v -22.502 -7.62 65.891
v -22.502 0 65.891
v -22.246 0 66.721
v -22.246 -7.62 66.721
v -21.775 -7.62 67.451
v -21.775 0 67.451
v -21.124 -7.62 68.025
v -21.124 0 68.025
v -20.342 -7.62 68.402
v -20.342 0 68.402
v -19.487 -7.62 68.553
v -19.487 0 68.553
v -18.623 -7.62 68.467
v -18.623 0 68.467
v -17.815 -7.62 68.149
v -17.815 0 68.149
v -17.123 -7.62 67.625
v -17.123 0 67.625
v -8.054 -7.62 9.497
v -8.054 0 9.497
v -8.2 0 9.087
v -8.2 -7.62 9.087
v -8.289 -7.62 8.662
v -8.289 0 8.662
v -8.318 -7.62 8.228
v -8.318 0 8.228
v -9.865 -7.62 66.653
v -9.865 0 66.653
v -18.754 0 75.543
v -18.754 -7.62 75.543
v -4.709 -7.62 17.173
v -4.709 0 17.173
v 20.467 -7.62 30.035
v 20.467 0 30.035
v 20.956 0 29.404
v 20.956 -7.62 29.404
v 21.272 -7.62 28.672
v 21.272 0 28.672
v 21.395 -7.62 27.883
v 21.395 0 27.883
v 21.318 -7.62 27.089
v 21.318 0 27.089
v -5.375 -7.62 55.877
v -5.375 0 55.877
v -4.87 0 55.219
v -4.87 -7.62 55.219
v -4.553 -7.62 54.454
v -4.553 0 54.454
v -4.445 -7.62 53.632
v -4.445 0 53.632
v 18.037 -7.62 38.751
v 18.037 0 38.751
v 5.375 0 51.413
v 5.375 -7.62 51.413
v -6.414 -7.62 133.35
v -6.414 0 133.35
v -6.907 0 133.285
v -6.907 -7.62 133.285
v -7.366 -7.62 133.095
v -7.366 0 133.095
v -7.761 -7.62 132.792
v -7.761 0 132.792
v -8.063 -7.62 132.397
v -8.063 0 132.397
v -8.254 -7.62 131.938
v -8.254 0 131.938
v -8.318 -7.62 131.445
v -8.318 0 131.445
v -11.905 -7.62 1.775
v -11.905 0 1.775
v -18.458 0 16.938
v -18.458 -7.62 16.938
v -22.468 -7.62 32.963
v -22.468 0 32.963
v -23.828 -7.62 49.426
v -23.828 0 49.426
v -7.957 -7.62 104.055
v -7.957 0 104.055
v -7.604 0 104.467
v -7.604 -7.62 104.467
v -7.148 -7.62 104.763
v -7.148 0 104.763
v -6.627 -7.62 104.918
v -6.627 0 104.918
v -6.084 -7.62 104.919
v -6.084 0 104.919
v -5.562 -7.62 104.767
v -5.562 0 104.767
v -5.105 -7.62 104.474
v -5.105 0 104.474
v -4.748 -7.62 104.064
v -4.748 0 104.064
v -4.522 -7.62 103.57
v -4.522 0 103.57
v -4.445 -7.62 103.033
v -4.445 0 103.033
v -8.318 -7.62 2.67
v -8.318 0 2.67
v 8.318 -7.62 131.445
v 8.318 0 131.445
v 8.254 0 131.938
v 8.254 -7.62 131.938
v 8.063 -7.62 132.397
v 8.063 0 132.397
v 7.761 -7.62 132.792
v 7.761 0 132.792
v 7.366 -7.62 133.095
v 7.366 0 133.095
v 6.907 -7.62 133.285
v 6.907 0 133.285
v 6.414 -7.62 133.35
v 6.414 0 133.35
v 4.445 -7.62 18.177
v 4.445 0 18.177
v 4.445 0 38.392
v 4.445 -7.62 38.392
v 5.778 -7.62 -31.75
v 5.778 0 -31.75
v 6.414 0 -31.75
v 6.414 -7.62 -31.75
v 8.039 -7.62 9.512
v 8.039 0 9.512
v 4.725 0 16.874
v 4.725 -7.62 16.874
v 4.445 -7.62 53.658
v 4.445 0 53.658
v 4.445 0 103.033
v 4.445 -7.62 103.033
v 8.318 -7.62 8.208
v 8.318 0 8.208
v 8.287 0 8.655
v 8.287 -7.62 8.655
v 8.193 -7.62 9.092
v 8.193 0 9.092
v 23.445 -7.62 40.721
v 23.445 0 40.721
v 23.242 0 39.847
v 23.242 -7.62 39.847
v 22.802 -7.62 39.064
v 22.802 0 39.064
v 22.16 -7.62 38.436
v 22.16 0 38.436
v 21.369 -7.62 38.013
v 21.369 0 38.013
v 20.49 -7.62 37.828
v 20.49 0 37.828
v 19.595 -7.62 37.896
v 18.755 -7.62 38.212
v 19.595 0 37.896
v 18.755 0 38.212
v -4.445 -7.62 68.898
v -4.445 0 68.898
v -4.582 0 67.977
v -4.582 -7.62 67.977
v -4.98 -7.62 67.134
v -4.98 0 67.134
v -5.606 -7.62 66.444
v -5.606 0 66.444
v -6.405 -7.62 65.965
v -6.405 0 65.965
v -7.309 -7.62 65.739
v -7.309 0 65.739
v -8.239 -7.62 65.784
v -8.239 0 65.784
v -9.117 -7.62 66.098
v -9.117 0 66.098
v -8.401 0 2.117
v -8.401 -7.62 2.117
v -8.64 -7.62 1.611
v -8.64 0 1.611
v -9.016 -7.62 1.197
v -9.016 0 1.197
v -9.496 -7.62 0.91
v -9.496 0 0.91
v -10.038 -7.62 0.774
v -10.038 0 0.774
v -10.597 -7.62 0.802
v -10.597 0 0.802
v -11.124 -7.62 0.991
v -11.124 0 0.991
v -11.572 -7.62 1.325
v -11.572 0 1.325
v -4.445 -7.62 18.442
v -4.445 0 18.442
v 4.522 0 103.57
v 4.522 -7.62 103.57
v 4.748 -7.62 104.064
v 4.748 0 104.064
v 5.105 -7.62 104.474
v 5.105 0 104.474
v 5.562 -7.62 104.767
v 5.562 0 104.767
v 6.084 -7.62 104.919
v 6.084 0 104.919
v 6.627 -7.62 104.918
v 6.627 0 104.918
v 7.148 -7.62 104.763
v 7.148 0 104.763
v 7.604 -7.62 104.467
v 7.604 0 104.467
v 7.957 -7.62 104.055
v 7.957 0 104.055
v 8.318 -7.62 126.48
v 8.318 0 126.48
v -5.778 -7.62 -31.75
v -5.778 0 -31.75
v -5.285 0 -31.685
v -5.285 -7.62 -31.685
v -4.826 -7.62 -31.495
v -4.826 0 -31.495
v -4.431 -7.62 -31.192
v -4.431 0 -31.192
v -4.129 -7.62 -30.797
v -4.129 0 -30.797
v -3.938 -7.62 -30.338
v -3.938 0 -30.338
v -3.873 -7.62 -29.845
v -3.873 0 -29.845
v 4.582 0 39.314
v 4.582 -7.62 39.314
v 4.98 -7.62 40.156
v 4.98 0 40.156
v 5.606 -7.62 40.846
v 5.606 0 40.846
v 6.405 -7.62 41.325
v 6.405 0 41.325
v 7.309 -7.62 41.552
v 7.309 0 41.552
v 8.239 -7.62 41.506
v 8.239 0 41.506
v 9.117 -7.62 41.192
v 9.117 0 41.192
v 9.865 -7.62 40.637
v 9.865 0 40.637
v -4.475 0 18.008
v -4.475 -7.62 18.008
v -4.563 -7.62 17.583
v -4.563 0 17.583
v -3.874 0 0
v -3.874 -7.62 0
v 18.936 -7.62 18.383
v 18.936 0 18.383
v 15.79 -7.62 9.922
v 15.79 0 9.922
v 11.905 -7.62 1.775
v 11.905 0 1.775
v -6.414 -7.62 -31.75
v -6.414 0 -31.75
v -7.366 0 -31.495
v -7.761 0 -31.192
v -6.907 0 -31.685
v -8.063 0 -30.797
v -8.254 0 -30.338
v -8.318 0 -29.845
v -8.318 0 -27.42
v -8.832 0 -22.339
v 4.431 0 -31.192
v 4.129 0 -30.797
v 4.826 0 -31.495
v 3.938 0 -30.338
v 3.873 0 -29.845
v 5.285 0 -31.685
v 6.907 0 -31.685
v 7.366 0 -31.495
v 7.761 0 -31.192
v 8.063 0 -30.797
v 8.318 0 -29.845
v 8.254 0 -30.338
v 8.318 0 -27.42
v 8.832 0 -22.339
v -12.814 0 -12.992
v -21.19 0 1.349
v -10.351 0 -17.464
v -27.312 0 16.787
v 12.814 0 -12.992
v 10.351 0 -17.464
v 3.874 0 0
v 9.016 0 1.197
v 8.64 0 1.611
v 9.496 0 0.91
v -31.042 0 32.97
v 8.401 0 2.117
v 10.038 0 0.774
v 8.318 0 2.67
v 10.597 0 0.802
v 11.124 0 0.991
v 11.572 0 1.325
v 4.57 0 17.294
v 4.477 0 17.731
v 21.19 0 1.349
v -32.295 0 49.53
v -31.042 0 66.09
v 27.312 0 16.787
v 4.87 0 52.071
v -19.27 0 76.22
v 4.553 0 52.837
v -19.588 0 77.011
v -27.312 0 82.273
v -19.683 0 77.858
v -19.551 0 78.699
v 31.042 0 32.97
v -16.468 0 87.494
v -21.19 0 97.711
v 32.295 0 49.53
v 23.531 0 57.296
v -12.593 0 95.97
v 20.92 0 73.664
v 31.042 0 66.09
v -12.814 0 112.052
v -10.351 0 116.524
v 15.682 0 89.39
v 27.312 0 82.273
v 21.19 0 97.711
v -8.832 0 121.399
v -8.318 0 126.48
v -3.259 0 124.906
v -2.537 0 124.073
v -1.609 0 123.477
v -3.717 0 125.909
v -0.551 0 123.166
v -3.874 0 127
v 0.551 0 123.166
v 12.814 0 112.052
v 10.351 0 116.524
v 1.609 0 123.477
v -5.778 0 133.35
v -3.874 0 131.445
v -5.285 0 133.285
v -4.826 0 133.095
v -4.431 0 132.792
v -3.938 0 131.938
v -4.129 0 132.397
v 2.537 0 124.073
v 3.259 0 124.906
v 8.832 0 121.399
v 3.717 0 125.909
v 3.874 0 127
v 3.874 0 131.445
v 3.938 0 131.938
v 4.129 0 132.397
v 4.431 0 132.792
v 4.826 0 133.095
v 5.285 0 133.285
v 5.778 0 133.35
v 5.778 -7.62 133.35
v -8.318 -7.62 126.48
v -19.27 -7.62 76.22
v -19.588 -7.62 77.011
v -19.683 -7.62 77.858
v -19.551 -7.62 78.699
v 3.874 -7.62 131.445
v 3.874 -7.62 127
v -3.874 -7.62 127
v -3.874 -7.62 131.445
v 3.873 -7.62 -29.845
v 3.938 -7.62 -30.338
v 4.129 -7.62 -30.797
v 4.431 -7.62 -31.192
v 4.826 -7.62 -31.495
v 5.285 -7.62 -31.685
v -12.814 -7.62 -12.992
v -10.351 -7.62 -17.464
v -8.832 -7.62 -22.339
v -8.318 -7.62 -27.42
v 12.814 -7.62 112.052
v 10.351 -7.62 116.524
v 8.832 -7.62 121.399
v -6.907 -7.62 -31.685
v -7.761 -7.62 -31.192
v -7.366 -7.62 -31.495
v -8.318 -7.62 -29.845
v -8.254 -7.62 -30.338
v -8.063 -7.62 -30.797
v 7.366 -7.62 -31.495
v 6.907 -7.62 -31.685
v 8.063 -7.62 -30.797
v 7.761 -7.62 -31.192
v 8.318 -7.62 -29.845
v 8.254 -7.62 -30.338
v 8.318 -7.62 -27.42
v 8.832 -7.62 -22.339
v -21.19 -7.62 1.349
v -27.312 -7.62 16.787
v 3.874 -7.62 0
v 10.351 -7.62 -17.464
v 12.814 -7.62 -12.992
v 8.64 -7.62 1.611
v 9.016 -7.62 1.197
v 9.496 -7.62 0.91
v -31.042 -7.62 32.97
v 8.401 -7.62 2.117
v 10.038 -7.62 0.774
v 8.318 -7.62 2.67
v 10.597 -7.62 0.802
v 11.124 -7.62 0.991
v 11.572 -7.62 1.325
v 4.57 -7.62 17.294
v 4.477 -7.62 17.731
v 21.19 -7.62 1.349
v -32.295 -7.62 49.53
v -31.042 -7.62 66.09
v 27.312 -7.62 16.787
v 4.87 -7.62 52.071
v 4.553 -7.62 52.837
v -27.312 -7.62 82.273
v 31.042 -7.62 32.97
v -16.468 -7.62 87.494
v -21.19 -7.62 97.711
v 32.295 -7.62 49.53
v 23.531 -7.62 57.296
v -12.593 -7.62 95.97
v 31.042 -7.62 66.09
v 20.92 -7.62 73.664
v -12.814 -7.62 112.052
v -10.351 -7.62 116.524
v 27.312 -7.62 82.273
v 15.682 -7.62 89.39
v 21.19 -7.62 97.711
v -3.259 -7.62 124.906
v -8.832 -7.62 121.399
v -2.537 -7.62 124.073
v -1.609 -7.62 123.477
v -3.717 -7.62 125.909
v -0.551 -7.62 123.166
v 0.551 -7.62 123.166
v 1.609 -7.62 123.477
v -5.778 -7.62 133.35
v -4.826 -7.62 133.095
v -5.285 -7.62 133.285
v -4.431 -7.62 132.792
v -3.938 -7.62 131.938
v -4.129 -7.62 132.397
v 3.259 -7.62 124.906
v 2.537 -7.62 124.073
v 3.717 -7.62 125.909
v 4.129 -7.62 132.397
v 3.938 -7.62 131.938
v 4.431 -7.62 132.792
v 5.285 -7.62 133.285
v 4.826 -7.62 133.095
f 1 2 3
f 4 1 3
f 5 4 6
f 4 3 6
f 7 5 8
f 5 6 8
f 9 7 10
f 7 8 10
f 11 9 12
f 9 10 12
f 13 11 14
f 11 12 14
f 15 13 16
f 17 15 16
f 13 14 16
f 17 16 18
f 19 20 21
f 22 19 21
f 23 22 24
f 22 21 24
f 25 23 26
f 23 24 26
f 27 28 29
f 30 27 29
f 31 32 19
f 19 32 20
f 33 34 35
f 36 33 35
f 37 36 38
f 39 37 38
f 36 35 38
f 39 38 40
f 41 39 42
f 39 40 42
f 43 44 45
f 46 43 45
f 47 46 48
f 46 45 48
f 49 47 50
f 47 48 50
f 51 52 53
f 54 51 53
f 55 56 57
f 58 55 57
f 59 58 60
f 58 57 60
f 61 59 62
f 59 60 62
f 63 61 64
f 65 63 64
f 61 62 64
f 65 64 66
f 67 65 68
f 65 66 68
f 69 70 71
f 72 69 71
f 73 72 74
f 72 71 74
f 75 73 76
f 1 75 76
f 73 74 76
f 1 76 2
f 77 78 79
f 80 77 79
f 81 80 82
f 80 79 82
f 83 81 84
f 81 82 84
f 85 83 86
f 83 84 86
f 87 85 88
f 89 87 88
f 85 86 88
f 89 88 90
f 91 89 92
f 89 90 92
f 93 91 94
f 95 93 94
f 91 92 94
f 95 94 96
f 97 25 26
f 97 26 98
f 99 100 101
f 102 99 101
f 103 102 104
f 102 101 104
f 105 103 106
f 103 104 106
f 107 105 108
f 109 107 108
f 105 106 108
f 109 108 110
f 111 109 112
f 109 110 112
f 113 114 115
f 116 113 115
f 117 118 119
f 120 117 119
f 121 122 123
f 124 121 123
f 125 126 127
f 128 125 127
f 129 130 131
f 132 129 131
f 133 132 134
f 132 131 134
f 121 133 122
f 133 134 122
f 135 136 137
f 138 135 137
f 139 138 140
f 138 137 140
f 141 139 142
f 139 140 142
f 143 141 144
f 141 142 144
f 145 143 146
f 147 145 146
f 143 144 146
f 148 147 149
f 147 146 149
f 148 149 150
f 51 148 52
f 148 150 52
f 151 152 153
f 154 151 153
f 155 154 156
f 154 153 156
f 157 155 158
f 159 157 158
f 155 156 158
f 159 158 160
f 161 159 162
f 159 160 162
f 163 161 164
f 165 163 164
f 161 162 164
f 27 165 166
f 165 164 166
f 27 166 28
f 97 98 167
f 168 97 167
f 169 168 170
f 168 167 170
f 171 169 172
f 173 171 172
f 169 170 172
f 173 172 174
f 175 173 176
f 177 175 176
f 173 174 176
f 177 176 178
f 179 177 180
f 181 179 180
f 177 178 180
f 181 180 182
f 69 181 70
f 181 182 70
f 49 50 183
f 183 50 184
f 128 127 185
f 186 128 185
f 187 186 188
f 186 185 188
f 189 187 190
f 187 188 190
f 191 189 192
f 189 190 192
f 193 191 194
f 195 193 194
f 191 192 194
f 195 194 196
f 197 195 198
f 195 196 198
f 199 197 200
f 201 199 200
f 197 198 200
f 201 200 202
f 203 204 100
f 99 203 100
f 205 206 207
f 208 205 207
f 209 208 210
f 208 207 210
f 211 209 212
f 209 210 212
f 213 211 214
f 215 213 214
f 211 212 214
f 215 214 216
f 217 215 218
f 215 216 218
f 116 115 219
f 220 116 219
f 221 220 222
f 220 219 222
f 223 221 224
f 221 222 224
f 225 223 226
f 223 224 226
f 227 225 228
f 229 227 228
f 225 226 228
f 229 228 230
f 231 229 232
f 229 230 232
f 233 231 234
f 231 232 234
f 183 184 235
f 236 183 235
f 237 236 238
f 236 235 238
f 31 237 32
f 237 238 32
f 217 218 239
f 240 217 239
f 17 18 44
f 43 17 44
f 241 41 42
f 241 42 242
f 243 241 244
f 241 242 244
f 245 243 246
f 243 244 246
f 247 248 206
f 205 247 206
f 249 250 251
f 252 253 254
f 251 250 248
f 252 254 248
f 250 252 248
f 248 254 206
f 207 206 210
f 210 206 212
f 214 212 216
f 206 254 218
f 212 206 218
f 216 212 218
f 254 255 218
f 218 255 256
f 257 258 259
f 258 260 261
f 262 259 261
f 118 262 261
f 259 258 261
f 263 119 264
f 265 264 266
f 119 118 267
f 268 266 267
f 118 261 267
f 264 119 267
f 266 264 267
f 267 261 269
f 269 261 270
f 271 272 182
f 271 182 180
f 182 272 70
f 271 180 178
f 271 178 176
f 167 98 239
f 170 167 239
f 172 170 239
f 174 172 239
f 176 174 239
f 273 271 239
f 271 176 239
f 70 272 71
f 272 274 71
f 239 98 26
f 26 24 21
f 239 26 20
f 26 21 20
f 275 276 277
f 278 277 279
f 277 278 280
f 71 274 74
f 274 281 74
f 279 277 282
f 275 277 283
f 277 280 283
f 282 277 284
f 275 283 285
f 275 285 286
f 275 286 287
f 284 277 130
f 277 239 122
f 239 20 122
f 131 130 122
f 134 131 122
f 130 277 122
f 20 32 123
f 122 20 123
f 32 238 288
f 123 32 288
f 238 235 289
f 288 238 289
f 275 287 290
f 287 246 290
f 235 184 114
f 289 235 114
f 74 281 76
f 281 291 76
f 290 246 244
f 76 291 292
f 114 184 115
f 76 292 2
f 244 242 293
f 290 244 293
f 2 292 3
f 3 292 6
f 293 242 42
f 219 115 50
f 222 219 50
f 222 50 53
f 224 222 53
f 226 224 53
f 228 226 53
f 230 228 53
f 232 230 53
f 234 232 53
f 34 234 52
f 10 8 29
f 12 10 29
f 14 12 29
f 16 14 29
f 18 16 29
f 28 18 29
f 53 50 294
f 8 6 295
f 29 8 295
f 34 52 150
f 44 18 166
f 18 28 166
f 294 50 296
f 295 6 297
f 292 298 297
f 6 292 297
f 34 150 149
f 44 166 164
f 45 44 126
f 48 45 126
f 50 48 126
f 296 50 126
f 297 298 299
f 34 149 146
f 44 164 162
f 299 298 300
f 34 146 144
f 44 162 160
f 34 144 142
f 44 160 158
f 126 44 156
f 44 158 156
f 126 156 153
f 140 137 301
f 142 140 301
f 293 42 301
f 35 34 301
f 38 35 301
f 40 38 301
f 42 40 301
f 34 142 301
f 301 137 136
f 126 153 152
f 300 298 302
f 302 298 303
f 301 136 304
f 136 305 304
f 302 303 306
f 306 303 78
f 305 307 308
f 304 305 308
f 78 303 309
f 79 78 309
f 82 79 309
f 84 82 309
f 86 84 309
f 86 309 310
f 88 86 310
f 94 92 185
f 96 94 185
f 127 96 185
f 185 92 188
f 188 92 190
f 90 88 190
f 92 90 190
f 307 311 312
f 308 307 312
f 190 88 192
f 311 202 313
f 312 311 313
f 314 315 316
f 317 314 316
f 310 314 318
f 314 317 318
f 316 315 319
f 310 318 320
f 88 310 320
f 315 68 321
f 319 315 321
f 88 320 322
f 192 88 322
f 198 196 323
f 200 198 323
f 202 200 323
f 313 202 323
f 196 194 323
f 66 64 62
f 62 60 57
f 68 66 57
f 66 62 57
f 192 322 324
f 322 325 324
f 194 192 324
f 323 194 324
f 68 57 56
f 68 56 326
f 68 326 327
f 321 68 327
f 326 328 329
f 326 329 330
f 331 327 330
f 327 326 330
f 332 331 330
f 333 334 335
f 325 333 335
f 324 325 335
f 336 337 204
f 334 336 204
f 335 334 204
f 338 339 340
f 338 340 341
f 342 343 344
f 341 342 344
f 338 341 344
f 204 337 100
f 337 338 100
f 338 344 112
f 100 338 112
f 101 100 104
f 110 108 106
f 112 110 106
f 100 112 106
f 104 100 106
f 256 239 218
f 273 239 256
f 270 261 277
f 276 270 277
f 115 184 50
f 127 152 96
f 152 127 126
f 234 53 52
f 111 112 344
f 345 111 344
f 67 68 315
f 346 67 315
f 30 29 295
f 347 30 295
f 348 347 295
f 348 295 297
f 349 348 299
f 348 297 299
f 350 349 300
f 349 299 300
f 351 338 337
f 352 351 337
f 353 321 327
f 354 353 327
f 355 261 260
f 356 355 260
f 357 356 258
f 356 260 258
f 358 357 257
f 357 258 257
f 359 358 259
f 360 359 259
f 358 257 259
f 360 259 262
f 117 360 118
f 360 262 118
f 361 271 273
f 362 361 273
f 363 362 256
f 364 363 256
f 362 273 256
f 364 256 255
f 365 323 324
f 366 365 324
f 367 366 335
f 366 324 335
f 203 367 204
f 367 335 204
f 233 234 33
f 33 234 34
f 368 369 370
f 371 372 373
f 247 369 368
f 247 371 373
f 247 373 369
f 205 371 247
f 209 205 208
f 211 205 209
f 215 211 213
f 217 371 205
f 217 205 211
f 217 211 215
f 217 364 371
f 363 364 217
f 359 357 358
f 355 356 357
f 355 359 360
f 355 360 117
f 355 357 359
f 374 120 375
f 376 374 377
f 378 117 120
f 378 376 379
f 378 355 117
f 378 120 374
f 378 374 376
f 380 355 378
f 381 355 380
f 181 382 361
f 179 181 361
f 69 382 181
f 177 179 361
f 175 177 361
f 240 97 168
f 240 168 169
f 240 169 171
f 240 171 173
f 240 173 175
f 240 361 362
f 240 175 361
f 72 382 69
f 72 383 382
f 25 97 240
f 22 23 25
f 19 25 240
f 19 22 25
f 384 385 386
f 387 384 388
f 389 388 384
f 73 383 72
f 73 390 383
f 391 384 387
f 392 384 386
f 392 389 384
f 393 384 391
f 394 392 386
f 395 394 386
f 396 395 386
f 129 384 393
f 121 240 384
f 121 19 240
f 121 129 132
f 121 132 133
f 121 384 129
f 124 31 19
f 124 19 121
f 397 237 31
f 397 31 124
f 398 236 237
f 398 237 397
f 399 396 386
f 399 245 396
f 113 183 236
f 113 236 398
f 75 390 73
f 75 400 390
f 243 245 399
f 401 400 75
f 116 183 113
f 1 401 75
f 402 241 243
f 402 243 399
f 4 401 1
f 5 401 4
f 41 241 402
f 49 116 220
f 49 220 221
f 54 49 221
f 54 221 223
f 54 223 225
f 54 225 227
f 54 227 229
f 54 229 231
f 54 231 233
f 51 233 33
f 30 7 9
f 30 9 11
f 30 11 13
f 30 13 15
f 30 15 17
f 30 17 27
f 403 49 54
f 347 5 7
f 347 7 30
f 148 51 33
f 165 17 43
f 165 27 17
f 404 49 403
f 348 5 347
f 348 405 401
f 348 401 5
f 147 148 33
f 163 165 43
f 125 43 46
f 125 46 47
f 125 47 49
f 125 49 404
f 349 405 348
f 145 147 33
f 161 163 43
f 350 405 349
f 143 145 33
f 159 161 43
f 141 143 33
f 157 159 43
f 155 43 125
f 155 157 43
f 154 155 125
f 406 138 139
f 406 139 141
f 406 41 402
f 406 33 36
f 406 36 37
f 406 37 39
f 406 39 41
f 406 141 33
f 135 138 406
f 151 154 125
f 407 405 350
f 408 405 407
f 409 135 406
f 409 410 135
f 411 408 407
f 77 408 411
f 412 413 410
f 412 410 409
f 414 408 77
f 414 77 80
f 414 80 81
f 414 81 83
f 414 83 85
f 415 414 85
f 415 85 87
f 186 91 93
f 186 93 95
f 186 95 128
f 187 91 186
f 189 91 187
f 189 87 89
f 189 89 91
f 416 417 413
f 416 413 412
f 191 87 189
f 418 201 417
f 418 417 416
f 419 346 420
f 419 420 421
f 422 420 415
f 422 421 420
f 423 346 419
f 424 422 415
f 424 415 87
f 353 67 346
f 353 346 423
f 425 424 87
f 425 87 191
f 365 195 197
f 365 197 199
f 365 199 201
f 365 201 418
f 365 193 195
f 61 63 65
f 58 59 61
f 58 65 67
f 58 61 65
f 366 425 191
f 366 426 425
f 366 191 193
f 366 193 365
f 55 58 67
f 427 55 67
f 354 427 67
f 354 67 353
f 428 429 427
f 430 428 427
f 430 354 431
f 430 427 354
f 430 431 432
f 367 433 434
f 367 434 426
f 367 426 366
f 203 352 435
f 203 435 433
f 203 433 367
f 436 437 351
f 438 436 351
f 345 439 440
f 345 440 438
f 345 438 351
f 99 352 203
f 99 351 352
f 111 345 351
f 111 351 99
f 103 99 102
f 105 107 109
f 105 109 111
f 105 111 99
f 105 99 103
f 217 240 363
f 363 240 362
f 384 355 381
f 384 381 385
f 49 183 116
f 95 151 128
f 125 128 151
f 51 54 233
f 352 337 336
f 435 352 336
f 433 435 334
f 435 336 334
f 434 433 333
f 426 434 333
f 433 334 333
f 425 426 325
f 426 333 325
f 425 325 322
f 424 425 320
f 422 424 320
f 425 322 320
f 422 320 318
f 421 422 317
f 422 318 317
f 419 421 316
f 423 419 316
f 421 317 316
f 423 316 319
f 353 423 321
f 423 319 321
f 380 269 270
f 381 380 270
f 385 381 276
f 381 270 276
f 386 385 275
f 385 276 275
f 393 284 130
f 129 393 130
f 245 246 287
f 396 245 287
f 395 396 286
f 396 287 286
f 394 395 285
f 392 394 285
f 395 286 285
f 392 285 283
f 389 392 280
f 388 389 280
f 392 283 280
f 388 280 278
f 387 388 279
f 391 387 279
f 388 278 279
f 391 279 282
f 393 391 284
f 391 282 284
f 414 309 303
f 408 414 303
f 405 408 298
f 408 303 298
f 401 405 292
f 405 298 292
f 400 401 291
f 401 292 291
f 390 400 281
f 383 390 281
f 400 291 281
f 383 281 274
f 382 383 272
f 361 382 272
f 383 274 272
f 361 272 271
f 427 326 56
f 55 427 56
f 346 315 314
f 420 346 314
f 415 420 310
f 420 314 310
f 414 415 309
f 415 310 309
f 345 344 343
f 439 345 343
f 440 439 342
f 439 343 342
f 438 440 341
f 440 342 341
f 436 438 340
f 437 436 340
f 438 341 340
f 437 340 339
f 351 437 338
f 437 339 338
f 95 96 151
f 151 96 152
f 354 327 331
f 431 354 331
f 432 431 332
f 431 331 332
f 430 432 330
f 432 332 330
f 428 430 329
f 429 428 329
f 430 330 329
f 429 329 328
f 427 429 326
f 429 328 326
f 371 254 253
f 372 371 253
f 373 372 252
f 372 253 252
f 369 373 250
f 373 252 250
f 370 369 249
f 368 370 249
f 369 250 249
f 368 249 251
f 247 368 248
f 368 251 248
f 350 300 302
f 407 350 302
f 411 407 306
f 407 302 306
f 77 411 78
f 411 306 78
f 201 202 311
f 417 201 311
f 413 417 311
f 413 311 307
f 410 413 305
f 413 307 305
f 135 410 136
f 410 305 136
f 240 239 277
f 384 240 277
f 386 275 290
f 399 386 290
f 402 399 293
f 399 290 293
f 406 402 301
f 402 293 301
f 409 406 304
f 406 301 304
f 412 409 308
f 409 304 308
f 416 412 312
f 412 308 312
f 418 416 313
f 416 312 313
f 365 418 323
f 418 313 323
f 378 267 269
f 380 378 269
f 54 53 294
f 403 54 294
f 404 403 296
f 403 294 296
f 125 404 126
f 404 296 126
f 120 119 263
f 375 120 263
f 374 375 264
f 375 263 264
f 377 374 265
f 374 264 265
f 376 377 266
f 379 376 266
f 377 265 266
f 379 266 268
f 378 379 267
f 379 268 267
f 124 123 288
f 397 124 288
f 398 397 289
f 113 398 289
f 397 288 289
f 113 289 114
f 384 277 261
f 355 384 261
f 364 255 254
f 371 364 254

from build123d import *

# Parameters (mm, degrees)
F1_DEPTH = 7.62


with BuildPart() as f1:
    # F0 (on Front) → F1 (new body)
    with BuildSketch(Plane.XZ):
        with BuildLine():
            Line((-3.8735, -29.845), (-3.8735, 0))
            Line((-3.8735, 0), (3.8735, 0))
            Line((3.8735, 0), (3.8735, -29.845))
            ThreePointArc((3.8735, -29.845), (4.431462, -31.192038), (5.7785, -31.75))
            Line((5.7785, -31.75), (6.4135, -31.75))
            ThreePointArc((6.4135, -31.75), (7.760538, -31.192038), (8.3185, -29.845))
            Line((8.3185, -29.845), (8.3185, -27.419537))
            ThreePointArc((8.3185, -27.419537), (9.468431, -19.863469), (12.814103, -12.991572))
            ThreePointArc((12.814103, -12.991572), (32.295171, 49.53), (12.814103, 112.051572))
            ThreePointArc((12.814103, 112.051572), (9.468431, 118.923469), (8.3185, 126.479537))
            Line((8.3185, 126.479537), (8.3185, 131.445))
            ThreePointArc((8.3185, 131.445), (7.760538, 132.792038), (6.4135, 133.35))
            Line((6.4135, 133.35), (5.7785, 133.35))
            ThreePointArc((5.7785, 133.35), (4.431462, 132.792038), (3.8735, 131.445))
            Line((3.8735, 131.445), (3.8735, 127))
            ThreePointArc((3.8735, 127), (0, 123.1265), (-3.8735, 127))
            Line((-3.8735, 127), (-3.8735, 131.445))
            ThreePointArc((-3.8735, 131.445), (-4.431462, 132.792038), (-5.7785, 133.35))
            Line((-5.7785, 133.35), (-6.4135, 133.35))
            ThreePointArc((-6.4135, 133.35), (-7.760538, 132.792038), (-8.3185, 131.445))
            Line((-8.3185, 131.445), (-8.3185, 126.479537))
            ThreePointArc((-8.3185, 126.479537), (-9.468431, 118.923469), (-12.814103, 112.051572))
            ThreePointArc((-12.814103, 112.051572), (-32.295171, 49.53), (-12.814103, -12.991572))
            ThreePointArc((-12.814103, -12.991572), (-9.468431, -19.863469), (-8.3185, -27.419537))
            Line((-8.3185, -27.419537), (-8.3185, -29.845))
            ThreePointArc((-8.3185, -29.845), (-7.760538, -31.192038), (-6.4135, -31.75))
            Line((-6.4135, -31.75), (-5.7785, -31.75))
            ThreePointArc((-5.7785, -31.75), (-4.431462, -31.192038), (-3.8735, -29.845))
        make_face()
        with BuildLine():
            ThreePointArc((-4.445, 18.441657), (-4.511776, 17.793916), (-4.709295, 17.173421))
            Line((-4.709295, 17.173421), (-8.054205, 9.496579))
            ThreePointArc((-8.054205, 9.496579), (-8.251724, 8.876084), (-8.3185, 8.228343))
            Line((-8.3185, 8.228343), (-8.3185, 2.670058))
            ThreePointArc((-8.3185, 2.670058), (-9.762051, 0.821791), (-11.904946, 1.774645))
            ThreePointArc((-11.904946, 1.774645), (-22.467997, 32.962926), (-22.501769, 65.891421))
            ThreePointArc((-22.501769, 65.891421), (-20.342296, 68.40201), (-17.123144, 67.625191))
            Line((-17.123144, 67.625191), (-5.374936, 55.876982))
            ThreePointArc((-5.374936, 55.876982), (-4.686682, 54.846938), (-4.445, 53.631918))
            Line((-4.445, 53.631918), (-4.445, 18.441657))
        make_face(mode=Mode.SUBTRACT)
        with BuildLine():
            ThreePointArc((8.3185, 8.20836), (8.247765, 8.874814), (8.038713, 9.511573))
            Line((8.038713, 9.511573), (4.724787, 16.873781))
            ThreePointArc((4.724787, 16.873781), (4.515735, 17.51054), (4.445, 18.176994))
            Line((4.445, 18.176994), (4.445, 38.391918))
            ThreePointArc((4.445, 38.391918), (6.40498, 41.325236), (9.865064, 40.636982))
            Line((9.865064, 40.636982), (20.466927, 30.035119))
            ThreePointArc((20.466927, 30.035119), (21.272034, 28.671577), (21.318445, 27.088767))
            ThreePointArc((21.318445, 27.088767), (17.456582, 14.11752), (11.904946, 1.774645))
            ThreePointArc((11.904946, 1.774645), (9.762051, 0.821791), (8.3185, 2.670058))
            Line((8.3185, 2.670058), (8.3185, 8.20836))
        make_face(mode=Mode.SUBTRACT)
        with BuildLine():
            ThreePointArc((-7.95743, 104.055176), (-5.817614, 104.861924), (-4.445, 103.032829))
            Line((-4.445, 103.032829), (-4.445, 68.898354))
            ThreePointArc((-4.445, 68.898354), (-6.40498, 65.965036), (-9.865064, 66.65329))
            Line((-9.865064, 66.65329), (-18.754319, 75.542545))
            ThreePointArc((-18.754319, 75.542545), (-19.587816, 77.011022), (-19.550592, 78.699145))
            ThreePointArc((-19.550592, 78.699145), (-14.627905, 91.776718), (-7.95743, 104.055176))
        make_face(mode=Mode.SUBTRACT)
        with BuildLine():
            ThreePointArc((4.445, 103.032829), (5.817614, 104.861924), (7.95743, 104.055176))
            ThreePointArc((7.95743, 104.055176), (20.919781, 73.664161), (23.445213, 40.720899))
            ThreePointArc((23.445213, 40.720899), (21.368761, 38.012906), (18.037106, 38.75112))
            Line((18.037106, 38.75112), (5.374936, 51.41329))
            ThreePointArc((5.374936, 51.41329), (4.686682, 52.443334), (4.445, 53.658354))
            Line((4.445, 53.658354), (4.445, 103.032829))
        make_face(mode=Mode.SUBTRACT)
    extrude(amount=F1_DEPTH)


solid = f1.part
